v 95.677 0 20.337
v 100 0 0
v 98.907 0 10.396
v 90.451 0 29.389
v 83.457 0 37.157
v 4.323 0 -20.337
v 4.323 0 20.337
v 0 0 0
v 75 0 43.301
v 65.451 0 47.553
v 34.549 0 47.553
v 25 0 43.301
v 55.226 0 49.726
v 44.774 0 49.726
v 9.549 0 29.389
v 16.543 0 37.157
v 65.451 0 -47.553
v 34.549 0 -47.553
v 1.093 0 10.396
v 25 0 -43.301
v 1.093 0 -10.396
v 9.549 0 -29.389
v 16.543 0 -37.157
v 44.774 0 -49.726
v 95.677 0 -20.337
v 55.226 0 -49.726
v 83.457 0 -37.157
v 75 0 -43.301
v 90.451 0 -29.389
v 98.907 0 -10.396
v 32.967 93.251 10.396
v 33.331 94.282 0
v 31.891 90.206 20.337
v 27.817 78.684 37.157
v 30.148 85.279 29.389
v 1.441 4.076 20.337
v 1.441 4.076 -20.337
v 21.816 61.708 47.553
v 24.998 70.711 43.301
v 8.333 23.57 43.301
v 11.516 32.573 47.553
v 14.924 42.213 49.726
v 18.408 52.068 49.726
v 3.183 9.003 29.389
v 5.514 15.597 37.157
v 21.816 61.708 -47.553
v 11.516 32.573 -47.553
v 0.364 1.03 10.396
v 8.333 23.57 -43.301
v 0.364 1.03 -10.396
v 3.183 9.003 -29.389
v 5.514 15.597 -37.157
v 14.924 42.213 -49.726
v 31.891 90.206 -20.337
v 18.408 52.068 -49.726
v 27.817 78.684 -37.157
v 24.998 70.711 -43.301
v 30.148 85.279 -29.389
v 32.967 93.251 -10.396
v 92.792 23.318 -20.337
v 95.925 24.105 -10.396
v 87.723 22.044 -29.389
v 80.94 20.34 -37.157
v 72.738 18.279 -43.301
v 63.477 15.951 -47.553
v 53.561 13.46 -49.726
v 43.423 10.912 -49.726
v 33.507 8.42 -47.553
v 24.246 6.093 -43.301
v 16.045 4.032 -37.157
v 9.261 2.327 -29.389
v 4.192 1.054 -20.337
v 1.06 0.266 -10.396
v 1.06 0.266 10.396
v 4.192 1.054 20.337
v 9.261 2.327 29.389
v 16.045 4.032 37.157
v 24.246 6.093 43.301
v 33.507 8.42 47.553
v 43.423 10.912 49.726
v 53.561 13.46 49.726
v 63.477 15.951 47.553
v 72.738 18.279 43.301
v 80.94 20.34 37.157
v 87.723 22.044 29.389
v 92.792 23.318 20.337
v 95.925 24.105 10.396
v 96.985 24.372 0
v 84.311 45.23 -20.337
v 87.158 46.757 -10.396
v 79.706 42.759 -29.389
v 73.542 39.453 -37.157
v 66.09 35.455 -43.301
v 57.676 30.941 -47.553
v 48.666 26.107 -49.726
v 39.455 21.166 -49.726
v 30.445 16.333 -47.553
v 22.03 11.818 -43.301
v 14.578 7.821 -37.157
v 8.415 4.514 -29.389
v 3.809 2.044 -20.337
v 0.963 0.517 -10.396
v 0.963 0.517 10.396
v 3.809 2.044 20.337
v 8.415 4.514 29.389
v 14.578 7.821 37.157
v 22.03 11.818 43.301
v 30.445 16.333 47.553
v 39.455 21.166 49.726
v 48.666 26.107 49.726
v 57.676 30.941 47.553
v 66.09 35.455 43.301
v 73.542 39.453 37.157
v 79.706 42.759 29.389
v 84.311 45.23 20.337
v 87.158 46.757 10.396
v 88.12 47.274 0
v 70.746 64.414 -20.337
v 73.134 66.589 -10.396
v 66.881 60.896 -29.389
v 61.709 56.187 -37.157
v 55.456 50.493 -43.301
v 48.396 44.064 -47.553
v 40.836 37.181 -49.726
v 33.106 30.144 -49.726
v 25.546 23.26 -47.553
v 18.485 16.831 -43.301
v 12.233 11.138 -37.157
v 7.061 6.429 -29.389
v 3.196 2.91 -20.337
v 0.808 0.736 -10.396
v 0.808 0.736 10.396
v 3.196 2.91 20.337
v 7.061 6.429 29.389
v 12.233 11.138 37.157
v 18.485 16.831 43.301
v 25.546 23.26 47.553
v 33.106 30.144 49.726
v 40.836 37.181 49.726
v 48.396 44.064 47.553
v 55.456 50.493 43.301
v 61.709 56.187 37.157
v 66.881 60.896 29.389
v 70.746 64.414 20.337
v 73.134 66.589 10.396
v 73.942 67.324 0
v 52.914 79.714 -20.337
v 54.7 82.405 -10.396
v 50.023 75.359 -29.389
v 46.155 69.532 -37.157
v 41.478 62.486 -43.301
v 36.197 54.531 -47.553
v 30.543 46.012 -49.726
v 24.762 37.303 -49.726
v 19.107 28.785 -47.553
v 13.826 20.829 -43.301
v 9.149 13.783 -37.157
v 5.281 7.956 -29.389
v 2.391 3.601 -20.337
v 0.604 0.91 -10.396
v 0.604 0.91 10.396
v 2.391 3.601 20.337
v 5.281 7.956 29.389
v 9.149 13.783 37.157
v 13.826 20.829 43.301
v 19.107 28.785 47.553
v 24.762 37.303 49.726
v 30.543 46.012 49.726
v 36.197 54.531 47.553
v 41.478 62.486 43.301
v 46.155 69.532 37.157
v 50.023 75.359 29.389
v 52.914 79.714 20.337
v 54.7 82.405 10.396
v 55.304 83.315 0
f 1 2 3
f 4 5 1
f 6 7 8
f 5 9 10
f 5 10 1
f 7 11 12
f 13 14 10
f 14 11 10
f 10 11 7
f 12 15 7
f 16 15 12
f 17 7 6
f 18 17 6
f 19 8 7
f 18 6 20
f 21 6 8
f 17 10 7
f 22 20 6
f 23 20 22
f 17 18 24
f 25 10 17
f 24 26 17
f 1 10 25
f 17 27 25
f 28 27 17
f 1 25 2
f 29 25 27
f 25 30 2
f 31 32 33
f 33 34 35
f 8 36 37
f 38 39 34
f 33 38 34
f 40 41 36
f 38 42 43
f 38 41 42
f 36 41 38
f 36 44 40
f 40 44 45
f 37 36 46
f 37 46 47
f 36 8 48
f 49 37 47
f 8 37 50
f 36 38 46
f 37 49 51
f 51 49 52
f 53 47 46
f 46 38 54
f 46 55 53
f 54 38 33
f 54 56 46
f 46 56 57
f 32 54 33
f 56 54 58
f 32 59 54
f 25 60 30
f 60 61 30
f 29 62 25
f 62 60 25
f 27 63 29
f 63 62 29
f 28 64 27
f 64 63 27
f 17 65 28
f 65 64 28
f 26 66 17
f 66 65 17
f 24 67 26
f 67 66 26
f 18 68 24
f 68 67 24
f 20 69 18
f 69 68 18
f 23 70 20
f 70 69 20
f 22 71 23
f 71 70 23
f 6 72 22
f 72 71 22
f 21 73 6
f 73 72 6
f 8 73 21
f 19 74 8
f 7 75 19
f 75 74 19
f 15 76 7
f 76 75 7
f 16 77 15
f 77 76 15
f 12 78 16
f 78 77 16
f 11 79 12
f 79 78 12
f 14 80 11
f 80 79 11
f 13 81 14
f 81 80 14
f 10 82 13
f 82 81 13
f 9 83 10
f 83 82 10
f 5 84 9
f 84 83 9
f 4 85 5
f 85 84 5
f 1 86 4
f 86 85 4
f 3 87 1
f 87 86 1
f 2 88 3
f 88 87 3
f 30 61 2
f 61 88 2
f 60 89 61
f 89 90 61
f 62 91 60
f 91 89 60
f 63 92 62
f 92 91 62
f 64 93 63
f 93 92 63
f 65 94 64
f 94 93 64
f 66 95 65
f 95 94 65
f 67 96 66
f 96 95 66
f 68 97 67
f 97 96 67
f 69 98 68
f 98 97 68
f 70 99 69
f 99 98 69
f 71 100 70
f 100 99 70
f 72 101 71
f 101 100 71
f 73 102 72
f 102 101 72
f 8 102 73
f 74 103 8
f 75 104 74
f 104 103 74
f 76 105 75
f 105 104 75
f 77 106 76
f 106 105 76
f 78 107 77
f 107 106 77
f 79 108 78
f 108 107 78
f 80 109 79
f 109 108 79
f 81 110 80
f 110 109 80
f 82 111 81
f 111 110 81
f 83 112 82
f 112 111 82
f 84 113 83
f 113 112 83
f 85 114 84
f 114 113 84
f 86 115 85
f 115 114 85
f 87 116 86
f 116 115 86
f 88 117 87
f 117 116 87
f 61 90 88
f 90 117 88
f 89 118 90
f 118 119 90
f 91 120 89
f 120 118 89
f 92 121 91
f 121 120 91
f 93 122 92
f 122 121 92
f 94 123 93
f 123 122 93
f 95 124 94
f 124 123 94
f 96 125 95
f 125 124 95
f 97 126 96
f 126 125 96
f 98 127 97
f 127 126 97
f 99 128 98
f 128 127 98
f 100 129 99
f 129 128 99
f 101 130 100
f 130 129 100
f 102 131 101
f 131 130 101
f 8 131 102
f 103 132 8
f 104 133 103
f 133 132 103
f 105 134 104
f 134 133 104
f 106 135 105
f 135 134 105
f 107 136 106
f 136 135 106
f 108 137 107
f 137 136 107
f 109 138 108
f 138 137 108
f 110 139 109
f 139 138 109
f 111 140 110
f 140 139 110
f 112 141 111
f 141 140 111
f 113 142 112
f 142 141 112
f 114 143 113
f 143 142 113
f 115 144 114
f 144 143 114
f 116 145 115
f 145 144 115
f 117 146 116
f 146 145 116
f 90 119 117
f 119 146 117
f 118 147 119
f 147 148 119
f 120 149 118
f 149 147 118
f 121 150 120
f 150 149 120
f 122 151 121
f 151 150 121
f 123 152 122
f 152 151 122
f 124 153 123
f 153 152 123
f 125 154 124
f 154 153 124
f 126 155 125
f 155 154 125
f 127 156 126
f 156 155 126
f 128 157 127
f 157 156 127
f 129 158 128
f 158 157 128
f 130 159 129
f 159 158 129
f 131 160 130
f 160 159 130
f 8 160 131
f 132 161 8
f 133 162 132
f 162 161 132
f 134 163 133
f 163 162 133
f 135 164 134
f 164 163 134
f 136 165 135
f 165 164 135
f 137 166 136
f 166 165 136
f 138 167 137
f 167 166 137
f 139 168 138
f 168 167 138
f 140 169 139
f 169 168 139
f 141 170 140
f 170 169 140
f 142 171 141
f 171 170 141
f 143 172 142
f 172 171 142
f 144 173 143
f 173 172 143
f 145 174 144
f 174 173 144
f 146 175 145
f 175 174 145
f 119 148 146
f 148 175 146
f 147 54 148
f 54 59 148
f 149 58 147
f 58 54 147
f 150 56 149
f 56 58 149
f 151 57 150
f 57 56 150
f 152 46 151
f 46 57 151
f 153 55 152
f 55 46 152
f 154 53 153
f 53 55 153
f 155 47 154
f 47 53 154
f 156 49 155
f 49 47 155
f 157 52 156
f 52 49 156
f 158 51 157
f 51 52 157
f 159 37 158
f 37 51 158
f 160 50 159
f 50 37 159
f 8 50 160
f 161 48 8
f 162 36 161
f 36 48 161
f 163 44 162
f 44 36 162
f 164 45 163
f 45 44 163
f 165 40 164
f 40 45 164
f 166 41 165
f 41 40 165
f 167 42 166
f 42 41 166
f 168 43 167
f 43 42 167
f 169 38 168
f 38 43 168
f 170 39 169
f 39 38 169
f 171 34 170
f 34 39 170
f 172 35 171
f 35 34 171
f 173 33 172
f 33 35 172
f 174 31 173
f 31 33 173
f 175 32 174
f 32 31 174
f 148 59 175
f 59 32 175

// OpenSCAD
$fn=30;
r=50;
triangleSide=(3*r)/sqrt(3);
rotate_extrude(angle=70.53) {
    translate([ r, 0.00, 0.00 ]) {
        circle(r);
    }
}
